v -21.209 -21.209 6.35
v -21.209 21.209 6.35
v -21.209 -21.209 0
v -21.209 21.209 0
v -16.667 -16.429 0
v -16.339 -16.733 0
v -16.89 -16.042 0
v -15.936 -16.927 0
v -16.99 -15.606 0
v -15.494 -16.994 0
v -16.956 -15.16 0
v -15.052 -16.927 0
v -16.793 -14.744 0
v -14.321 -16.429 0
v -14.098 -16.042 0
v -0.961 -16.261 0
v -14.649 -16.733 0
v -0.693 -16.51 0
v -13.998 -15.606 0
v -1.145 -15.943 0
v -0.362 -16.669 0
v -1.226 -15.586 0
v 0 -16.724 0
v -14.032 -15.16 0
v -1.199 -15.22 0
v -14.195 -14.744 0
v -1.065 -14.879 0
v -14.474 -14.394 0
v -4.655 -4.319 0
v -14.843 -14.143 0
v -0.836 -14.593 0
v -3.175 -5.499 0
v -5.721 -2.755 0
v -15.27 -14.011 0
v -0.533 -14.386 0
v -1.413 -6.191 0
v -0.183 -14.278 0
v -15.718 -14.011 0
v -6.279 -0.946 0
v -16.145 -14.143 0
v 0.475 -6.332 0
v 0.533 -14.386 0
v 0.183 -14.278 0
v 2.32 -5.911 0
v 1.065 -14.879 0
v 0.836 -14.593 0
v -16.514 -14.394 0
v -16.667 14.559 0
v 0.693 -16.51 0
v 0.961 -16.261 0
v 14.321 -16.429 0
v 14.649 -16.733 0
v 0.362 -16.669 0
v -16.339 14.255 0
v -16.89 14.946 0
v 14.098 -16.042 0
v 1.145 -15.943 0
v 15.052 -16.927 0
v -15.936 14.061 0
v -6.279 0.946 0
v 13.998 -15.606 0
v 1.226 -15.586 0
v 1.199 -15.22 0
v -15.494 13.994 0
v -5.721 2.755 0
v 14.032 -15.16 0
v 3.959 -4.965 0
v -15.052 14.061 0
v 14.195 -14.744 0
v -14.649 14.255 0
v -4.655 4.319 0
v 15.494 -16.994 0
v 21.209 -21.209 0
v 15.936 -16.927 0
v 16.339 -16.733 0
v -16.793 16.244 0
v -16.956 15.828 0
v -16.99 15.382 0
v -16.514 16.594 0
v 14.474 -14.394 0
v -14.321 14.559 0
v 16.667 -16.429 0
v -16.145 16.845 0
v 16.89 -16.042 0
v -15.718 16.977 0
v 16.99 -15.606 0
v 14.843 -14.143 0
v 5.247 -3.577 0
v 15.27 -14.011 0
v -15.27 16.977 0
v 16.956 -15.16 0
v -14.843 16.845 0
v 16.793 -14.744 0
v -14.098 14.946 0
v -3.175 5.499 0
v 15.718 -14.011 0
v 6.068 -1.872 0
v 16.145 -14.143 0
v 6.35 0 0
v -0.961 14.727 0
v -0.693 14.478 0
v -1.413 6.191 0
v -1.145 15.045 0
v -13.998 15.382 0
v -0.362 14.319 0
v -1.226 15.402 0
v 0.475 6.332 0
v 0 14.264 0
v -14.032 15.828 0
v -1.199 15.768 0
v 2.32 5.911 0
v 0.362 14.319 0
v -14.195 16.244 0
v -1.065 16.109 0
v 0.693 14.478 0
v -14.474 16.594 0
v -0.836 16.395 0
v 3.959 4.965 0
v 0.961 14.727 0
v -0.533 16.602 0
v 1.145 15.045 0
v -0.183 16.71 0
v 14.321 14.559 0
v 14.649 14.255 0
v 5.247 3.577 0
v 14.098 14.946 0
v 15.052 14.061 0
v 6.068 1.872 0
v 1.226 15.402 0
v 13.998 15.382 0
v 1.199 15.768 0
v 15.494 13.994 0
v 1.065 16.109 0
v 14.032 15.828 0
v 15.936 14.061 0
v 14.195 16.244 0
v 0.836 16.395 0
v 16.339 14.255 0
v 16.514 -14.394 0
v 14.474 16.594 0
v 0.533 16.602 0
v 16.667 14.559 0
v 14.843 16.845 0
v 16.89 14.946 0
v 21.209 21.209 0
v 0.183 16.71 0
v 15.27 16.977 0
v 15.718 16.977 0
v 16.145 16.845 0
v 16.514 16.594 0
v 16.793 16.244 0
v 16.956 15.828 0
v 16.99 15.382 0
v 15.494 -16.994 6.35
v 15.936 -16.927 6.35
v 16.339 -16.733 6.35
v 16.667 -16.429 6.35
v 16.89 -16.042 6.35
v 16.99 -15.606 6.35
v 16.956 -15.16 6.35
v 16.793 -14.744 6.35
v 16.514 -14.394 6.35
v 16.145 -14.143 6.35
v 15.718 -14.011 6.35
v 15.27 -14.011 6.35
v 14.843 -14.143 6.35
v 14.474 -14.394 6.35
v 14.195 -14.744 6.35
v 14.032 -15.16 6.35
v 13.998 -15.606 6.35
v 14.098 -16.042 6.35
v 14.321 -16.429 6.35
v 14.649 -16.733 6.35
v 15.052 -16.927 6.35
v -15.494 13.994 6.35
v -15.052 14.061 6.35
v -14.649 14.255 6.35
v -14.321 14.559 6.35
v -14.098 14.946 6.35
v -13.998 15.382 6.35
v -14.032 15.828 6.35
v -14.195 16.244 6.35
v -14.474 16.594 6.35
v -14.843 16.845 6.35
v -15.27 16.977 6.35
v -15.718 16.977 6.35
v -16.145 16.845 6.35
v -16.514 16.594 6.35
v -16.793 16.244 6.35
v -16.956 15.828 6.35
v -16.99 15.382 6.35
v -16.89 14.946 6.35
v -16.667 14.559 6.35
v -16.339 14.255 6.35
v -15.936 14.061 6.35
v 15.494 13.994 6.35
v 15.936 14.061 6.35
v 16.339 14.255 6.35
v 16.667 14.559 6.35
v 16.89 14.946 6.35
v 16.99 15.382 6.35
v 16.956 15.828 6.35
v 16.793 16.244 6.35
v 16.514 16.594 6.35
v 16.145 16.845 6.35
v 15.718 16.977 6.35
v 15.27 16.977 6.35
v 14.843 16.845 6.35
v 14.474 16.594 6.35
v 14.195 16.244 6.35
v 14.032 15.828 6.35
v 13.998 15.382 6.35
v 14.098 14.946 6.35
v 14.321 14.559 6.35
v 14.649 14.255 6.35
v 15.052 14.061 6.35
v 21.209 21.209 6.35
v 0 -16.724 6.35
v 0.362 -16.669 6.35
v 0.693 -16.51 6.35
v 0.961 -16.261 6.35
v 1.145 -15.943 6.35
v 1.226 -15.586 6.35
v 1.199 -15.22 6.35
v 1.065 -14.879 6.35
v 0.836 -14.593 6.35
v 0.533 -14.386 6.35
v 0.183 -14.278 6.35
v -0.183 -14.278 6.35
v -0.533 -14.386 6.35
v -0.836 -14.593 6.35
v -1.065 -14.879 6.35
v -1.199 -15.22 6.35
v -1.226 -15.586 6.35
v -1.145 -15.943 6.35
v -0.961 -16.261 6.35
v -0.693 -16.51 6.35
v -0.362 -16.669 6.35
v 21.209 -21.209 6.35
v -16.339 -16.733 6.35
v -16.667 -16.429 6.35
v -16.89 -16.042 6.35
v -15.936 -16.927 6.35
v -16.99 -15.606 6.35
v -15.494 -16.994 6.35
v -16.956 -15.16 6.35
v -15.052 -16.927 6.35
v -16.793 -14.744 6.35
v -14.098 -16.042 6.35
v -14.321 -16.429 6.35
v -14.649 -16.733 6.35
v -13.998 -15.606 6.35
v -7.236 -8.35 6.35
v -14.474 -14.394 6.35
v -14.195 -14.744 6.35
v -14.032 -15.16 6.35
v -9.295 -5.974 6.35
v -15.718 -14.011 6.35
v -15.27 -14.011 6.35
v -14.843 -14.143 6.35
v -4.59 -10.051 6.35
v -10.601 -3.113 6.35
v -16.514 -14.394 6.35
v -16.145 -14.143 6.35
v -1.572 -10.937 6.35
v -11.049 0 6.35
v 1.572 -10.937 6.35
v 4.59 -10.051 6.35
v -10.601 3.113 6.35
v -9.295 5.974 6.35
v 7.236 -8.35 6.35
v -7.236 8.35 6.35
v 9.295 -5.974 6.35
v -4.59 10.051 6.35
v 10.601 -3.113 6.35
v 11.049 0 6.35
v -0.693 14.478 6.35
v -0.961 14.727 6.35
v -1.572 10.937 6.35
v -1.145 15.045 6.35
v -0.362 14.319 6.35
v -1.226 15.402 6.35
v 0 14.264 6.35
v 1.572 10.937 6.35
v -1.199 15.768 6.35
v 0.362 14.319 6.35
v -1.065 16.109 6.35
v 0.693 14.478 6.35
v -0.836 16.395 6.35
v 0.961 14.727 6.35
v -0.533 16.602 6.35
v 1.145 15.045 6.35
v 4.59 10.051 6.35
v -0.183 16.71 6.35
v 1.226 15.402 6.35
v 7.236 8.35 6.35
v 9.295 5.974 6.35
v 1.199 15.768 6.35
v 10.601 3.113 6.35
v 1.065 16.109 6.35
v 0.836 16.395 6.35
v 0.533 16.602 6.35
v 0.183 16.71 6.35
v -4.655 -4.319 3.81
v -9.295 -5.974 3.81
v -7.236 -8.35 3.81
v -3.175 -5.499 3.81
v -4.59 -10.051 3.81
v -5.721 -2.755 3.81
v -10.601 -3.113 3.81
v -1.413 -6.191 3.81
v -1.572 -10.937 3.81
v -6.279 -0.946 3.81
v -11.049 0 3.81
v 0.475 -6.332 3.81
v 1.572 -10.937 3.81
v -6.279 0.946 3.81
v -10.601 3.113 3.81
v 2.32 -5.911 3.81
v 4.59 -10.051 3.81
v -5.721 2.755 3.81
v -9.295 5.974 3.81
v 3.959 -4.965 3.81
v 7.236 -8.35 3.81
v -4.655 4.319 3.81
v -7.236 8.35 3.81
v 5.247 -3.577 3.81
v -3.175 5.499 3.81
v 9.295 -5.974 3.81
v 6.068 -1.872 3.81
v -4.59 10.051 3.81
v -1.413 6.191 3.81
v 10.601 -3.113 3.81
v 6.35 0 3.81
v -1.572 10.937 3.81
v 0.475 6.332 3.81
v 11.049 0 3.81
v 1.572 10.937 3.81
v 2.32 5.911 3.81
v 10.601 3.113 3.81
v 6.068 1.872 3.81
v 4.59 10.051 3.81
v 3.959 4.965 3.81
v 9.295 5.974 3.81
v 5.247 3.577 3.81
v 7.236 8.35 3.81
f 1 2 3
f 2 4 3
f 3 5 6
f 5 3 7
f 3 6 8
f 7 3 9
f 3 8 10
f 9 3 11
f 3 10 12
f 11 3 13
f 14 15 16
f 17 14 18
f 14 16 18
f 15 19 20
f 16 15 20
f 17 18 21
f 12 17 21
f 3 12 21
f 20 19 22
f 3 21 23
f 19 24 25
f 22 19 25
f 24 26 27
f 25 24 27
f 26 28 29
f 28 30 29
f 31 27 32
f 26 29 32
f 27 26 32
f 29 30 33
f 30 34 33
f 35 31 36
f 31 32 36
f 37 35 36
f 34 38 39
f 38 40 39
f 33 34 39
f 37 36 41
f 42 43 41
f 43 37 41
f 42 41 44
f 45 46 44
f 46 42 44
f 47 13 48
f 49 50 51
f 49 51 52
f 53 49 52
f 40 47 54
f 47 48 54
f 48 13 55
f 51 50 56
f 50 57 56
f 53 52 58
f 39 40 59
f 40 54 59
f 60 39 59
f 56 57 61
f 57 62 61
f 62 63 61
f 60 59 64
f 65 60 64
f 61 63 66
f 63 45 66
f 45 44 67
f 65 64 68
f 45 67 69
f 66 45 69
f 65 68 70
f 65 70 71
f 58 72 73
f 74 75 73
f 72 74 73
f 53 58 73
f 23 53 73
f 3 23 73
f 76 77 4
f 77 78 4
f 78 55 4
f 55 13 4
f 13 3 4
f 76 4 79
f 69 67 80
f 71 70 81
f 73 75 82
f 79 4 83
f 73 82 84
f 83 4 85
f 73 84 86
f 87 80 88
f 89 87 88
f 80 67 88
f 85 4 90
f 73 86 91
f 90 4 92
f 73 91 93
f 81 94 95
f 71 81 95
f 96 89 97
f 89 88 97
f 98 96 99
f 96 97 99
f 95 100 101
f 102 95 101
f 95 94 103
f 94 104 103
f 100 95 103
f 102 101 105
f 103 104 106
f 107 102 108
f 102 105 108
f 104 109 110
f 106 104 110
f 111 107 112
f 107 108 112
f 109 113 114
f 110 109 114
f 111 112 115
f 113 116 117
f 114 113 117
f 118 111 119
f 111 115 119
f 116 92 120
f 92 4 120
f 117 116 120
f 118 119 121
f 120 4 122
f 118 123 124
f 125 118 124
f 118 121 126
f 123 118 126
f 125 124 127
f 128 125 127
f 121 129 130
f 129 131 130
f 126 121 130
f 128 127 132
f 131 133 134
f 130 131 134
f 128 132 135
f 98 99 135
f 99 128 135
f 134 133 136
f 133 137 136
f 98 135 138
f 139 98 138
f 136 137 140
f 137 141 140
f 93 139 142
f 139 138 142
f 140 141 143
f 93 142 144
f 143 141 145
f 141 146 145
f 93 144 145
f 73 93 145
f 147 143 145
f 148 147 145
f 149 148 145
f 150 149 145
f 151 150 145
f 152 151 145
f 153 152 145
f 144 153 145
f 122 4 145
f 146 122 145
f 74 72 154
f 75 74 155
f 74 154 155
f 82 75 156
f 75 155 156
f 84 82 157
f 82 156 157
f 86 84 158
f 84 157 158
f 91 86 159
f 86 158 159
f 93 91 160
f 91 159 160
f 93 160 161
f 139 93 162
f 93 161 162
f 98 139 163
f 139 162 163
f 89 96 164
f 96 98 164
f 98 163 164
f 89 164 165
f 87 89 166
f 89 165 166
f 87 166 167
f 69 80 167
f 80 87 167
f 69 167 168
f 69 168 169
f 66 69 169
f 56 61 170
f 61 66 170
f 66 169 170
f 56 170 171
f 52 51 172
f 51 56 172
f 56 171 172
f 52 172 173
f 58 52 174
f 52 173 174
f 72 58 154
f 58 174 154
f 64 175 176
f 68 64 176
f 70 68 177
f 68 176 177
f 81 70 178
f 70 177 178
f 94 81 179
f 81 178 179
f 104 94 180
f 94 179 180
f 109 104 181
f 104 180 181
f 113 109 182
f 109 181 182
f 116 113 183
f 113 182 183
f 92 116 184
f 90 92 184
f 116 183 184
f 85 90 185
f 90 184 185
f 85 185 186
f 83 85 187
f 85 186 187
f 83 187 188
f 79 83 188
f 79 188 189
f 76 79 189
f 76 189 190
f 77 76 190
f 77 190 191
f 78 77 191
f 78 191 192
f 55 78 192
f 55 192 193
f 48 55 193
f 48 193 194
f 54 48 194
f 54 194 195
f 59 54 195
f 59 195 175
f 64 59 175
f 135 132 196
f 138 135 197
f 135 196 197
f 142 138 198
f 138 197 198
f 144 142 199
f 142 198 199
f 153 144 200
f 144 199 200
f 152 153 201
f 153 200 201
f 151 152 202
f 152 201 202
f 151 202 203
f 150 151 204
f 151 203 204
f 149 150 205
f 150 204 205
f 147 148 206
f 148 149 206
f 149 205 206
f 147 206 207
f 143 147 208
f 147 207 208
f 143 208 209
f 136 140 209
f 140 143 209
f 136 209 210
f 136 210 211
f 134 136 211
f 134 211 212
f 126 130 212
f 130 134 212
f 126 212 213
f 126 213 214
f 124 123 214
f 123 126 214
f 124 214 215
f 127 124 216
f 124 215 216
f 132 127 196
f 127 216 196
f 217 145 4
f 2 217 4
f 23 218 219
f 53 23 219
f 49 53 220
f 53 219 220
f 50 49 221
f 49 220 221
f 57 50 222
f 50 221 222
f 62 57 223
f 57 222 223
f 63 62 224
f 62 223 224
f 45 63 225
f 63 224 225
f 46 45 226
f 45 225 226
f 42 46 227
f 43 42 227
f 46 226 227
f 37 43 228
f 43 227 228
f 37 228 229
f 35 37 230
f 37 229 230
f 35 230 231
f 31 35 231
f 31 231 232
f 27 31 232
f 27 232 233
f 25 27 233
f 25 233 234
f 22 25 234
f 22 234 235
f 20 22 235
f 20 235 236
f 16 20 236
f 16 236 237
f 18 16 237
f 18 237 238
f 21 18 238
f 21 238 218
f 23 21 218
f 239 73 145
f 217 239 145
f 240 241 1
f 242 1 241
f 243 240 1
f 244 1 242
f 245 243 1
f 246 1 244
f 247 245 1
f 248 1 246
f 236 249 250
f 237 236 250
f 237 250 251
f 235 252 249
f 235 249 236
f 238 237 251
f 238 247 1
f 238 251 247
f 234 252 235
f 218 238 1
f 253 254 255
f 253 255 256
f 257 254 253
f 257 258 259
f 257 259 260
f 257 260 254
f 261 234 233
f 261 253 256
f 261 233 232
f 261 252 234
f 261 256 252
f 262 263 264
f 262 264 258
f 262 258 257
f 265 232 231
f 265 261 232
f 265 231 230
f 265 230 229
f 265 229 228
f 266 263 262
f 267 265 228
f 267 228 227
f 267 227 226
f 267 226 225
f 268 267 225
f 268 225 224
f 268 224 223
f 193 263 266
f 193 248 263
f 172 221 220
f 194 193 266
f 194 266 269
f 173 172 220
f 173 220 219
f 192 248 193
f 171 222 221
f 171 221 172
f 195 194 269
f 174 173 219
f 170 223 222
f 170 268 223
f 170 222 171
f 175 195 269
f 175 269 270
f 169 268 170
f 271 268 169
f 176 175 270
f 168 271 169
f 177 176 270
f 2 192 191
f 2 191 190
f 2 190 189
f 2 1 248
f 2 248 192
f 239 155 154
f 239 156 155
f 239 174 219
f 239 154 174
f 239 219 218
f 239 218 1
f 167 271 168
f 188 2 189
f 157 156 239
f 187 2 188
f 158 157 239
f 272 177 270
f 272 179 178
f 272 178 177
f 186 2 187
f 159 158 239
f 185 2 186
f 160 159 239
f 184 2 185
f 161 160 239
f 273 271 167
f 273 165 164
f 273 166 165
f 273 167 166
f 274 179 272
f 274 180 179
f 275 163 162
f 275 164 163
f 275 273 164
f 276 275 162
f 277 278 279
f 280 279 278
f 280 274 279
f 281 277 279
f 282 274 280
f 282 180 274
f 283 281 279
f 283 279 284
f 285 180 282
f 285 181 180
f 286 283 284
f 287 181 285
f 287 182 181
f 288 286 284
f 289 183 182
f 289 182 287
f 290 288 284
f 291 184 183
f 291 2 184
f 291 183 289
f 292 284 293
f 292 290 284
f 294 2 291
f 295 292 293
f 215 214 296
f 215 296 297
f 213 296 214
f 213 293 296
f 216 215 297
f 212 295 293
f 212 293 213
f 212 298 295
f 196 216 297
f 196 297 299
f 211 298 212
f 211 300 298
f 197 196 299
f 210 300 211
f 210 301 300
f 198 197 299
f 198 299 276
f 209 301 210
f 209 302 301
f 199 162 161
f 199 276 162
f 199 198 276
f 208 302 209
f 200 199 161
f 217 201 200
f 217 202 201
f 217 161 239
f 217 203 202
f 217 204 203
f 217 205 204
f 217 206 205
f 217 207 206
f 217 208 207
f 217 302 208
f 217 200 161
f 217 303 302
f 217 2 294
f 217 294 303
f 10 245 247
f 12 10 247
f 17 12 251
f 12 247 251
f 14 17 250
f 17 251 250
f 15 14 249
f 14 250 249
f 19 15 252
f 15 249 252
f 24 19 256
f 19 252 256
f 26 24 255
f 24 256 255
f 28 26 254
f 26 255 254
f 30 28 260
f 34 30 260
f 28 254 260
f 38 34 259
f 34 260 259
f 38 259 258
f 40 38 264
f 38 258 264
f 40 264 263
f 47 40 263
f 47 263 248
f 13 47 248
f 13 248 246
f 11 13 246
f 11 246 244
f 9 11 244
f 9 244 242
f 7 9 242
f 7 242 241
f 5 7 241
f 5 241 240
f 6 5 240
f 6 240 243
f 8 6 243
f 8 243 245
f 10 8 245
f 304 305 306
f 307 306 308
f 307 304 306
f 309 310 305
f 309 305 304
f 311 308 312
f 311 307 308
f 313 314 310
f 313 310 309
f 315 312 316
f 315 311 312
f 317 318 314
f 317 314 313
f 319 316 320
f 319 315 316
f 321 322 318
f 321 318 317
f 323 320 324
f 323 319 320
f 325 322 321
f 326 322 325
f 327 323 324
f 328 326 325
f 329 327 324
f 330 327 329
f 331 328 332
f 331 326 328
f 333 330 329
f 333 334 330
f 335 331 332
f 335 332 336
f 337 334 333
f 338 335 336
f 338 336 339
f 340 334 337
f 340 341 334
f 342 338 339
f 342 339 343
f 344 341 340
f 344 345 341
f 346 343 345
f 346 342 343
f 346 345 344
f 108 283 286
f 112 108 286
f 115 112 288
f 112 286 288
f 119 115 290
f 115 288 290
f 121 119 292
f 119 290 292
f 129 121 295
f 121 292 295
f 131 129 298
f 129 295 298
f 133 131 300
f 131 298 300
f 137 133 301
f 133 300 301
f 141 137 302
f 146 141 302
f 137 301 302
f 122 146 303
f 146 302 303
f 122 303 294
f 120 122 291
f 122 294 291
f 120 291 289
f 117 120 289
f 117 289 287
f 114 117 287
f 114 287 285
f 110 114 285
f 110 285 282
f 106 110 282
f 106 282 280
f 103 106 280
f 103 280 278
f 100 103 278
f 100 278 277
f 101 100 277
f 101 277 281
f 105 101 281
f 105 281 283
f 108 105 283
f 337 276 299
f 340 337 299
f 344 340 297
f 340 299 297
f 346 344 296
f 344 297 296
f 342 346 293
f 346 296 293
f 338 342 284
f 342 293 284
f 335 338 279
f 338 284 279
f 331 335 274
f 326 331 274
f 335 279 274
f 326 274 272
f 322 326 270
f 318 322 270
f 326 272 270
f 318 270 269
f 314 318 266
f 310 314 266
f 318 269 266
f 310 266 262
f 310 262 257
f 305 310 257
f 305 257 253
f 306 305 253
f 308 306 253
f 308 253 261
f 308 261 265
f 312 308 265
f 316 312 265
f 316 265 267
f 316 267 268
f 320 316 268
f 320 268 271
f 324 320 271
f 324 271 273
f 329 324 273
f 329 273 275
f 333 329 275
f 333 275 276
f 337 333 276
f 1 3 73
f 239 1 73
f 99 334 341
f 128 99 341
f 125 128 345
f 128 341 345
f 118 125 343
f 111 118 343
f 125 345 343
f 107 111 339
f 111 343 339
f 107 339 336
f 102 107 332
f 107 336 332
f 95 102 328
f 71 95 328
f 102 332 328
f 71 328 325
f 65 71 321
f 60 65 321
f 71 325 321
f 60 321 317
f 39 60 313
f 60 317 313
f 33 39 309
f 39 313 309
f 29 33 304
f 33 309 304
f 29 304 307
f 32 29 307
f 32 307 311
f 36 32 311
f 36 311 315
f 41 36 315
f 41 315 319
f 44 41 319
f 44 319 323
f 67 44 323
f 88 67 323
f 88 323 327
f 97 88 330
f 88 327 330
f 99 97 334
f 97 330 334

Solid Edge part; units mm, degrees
sketch "Sketch1" plane through (0, 0, 0) normal (0, 0, 1) x (1, 0, 0)
  line L0 (-21.209, -21.209) -> (21.209, -21.209)
  line L1 (21.209, -21.209) -> (21.209, 21.209)
  line L2 (21.209, 21.209) -> (-21.209, 21.209)
  line L3 (-21.209, 21.209) -> (-21.209, -21.209)
  dimension "D1" = 42.418
  dimension "D2" = 42.418
extrude "Protrusion1" add sketch "Sketch1" along normal blind 6.35
sketch "Sketch2" plane through (0, 0, 6.35) normal (0, 0, 1) x (1, 0, 0)
  circle A0 centre (0, 0) radius 11.049
extrude "MotorMountHole" cut sketch "Sketch2" against normal blind 2.54
sketch "Sketch3" plane through (0, 0, 3.81) normal (0, 0, 1) x (1, 0, 0)
  circle A0 centre (0, 0) radius 6.35
extrude "ShaftHole" cut sketch "Sketch3" against normal blind 25.4
hole "Hole1" at (-15.494, -15.494, 6.35) direction (0, 0, -1) diameter 3 end up to next
hole "Hole2" at (-15.494, 15.494, 6.35) direction (0, 0, -1) diameter 3 end up to next
mirror "Mirror1" about plane through (0, 0, 0) normal (1, 0, 0) of "Hole1", "Hole2"
hole "Hole_5" at (0, 15.494, 6.35) direction (0, 0, -1) diameter 2.459 end up to next thread major 3 thread length 50.8
hole "Hole5" at (0, -15.494, 6.35) direction (0, 0, -1) diameter 2.459 end up to next thread major 3 thread length 50.8
properties material "Aluminum, 6061-T6"
